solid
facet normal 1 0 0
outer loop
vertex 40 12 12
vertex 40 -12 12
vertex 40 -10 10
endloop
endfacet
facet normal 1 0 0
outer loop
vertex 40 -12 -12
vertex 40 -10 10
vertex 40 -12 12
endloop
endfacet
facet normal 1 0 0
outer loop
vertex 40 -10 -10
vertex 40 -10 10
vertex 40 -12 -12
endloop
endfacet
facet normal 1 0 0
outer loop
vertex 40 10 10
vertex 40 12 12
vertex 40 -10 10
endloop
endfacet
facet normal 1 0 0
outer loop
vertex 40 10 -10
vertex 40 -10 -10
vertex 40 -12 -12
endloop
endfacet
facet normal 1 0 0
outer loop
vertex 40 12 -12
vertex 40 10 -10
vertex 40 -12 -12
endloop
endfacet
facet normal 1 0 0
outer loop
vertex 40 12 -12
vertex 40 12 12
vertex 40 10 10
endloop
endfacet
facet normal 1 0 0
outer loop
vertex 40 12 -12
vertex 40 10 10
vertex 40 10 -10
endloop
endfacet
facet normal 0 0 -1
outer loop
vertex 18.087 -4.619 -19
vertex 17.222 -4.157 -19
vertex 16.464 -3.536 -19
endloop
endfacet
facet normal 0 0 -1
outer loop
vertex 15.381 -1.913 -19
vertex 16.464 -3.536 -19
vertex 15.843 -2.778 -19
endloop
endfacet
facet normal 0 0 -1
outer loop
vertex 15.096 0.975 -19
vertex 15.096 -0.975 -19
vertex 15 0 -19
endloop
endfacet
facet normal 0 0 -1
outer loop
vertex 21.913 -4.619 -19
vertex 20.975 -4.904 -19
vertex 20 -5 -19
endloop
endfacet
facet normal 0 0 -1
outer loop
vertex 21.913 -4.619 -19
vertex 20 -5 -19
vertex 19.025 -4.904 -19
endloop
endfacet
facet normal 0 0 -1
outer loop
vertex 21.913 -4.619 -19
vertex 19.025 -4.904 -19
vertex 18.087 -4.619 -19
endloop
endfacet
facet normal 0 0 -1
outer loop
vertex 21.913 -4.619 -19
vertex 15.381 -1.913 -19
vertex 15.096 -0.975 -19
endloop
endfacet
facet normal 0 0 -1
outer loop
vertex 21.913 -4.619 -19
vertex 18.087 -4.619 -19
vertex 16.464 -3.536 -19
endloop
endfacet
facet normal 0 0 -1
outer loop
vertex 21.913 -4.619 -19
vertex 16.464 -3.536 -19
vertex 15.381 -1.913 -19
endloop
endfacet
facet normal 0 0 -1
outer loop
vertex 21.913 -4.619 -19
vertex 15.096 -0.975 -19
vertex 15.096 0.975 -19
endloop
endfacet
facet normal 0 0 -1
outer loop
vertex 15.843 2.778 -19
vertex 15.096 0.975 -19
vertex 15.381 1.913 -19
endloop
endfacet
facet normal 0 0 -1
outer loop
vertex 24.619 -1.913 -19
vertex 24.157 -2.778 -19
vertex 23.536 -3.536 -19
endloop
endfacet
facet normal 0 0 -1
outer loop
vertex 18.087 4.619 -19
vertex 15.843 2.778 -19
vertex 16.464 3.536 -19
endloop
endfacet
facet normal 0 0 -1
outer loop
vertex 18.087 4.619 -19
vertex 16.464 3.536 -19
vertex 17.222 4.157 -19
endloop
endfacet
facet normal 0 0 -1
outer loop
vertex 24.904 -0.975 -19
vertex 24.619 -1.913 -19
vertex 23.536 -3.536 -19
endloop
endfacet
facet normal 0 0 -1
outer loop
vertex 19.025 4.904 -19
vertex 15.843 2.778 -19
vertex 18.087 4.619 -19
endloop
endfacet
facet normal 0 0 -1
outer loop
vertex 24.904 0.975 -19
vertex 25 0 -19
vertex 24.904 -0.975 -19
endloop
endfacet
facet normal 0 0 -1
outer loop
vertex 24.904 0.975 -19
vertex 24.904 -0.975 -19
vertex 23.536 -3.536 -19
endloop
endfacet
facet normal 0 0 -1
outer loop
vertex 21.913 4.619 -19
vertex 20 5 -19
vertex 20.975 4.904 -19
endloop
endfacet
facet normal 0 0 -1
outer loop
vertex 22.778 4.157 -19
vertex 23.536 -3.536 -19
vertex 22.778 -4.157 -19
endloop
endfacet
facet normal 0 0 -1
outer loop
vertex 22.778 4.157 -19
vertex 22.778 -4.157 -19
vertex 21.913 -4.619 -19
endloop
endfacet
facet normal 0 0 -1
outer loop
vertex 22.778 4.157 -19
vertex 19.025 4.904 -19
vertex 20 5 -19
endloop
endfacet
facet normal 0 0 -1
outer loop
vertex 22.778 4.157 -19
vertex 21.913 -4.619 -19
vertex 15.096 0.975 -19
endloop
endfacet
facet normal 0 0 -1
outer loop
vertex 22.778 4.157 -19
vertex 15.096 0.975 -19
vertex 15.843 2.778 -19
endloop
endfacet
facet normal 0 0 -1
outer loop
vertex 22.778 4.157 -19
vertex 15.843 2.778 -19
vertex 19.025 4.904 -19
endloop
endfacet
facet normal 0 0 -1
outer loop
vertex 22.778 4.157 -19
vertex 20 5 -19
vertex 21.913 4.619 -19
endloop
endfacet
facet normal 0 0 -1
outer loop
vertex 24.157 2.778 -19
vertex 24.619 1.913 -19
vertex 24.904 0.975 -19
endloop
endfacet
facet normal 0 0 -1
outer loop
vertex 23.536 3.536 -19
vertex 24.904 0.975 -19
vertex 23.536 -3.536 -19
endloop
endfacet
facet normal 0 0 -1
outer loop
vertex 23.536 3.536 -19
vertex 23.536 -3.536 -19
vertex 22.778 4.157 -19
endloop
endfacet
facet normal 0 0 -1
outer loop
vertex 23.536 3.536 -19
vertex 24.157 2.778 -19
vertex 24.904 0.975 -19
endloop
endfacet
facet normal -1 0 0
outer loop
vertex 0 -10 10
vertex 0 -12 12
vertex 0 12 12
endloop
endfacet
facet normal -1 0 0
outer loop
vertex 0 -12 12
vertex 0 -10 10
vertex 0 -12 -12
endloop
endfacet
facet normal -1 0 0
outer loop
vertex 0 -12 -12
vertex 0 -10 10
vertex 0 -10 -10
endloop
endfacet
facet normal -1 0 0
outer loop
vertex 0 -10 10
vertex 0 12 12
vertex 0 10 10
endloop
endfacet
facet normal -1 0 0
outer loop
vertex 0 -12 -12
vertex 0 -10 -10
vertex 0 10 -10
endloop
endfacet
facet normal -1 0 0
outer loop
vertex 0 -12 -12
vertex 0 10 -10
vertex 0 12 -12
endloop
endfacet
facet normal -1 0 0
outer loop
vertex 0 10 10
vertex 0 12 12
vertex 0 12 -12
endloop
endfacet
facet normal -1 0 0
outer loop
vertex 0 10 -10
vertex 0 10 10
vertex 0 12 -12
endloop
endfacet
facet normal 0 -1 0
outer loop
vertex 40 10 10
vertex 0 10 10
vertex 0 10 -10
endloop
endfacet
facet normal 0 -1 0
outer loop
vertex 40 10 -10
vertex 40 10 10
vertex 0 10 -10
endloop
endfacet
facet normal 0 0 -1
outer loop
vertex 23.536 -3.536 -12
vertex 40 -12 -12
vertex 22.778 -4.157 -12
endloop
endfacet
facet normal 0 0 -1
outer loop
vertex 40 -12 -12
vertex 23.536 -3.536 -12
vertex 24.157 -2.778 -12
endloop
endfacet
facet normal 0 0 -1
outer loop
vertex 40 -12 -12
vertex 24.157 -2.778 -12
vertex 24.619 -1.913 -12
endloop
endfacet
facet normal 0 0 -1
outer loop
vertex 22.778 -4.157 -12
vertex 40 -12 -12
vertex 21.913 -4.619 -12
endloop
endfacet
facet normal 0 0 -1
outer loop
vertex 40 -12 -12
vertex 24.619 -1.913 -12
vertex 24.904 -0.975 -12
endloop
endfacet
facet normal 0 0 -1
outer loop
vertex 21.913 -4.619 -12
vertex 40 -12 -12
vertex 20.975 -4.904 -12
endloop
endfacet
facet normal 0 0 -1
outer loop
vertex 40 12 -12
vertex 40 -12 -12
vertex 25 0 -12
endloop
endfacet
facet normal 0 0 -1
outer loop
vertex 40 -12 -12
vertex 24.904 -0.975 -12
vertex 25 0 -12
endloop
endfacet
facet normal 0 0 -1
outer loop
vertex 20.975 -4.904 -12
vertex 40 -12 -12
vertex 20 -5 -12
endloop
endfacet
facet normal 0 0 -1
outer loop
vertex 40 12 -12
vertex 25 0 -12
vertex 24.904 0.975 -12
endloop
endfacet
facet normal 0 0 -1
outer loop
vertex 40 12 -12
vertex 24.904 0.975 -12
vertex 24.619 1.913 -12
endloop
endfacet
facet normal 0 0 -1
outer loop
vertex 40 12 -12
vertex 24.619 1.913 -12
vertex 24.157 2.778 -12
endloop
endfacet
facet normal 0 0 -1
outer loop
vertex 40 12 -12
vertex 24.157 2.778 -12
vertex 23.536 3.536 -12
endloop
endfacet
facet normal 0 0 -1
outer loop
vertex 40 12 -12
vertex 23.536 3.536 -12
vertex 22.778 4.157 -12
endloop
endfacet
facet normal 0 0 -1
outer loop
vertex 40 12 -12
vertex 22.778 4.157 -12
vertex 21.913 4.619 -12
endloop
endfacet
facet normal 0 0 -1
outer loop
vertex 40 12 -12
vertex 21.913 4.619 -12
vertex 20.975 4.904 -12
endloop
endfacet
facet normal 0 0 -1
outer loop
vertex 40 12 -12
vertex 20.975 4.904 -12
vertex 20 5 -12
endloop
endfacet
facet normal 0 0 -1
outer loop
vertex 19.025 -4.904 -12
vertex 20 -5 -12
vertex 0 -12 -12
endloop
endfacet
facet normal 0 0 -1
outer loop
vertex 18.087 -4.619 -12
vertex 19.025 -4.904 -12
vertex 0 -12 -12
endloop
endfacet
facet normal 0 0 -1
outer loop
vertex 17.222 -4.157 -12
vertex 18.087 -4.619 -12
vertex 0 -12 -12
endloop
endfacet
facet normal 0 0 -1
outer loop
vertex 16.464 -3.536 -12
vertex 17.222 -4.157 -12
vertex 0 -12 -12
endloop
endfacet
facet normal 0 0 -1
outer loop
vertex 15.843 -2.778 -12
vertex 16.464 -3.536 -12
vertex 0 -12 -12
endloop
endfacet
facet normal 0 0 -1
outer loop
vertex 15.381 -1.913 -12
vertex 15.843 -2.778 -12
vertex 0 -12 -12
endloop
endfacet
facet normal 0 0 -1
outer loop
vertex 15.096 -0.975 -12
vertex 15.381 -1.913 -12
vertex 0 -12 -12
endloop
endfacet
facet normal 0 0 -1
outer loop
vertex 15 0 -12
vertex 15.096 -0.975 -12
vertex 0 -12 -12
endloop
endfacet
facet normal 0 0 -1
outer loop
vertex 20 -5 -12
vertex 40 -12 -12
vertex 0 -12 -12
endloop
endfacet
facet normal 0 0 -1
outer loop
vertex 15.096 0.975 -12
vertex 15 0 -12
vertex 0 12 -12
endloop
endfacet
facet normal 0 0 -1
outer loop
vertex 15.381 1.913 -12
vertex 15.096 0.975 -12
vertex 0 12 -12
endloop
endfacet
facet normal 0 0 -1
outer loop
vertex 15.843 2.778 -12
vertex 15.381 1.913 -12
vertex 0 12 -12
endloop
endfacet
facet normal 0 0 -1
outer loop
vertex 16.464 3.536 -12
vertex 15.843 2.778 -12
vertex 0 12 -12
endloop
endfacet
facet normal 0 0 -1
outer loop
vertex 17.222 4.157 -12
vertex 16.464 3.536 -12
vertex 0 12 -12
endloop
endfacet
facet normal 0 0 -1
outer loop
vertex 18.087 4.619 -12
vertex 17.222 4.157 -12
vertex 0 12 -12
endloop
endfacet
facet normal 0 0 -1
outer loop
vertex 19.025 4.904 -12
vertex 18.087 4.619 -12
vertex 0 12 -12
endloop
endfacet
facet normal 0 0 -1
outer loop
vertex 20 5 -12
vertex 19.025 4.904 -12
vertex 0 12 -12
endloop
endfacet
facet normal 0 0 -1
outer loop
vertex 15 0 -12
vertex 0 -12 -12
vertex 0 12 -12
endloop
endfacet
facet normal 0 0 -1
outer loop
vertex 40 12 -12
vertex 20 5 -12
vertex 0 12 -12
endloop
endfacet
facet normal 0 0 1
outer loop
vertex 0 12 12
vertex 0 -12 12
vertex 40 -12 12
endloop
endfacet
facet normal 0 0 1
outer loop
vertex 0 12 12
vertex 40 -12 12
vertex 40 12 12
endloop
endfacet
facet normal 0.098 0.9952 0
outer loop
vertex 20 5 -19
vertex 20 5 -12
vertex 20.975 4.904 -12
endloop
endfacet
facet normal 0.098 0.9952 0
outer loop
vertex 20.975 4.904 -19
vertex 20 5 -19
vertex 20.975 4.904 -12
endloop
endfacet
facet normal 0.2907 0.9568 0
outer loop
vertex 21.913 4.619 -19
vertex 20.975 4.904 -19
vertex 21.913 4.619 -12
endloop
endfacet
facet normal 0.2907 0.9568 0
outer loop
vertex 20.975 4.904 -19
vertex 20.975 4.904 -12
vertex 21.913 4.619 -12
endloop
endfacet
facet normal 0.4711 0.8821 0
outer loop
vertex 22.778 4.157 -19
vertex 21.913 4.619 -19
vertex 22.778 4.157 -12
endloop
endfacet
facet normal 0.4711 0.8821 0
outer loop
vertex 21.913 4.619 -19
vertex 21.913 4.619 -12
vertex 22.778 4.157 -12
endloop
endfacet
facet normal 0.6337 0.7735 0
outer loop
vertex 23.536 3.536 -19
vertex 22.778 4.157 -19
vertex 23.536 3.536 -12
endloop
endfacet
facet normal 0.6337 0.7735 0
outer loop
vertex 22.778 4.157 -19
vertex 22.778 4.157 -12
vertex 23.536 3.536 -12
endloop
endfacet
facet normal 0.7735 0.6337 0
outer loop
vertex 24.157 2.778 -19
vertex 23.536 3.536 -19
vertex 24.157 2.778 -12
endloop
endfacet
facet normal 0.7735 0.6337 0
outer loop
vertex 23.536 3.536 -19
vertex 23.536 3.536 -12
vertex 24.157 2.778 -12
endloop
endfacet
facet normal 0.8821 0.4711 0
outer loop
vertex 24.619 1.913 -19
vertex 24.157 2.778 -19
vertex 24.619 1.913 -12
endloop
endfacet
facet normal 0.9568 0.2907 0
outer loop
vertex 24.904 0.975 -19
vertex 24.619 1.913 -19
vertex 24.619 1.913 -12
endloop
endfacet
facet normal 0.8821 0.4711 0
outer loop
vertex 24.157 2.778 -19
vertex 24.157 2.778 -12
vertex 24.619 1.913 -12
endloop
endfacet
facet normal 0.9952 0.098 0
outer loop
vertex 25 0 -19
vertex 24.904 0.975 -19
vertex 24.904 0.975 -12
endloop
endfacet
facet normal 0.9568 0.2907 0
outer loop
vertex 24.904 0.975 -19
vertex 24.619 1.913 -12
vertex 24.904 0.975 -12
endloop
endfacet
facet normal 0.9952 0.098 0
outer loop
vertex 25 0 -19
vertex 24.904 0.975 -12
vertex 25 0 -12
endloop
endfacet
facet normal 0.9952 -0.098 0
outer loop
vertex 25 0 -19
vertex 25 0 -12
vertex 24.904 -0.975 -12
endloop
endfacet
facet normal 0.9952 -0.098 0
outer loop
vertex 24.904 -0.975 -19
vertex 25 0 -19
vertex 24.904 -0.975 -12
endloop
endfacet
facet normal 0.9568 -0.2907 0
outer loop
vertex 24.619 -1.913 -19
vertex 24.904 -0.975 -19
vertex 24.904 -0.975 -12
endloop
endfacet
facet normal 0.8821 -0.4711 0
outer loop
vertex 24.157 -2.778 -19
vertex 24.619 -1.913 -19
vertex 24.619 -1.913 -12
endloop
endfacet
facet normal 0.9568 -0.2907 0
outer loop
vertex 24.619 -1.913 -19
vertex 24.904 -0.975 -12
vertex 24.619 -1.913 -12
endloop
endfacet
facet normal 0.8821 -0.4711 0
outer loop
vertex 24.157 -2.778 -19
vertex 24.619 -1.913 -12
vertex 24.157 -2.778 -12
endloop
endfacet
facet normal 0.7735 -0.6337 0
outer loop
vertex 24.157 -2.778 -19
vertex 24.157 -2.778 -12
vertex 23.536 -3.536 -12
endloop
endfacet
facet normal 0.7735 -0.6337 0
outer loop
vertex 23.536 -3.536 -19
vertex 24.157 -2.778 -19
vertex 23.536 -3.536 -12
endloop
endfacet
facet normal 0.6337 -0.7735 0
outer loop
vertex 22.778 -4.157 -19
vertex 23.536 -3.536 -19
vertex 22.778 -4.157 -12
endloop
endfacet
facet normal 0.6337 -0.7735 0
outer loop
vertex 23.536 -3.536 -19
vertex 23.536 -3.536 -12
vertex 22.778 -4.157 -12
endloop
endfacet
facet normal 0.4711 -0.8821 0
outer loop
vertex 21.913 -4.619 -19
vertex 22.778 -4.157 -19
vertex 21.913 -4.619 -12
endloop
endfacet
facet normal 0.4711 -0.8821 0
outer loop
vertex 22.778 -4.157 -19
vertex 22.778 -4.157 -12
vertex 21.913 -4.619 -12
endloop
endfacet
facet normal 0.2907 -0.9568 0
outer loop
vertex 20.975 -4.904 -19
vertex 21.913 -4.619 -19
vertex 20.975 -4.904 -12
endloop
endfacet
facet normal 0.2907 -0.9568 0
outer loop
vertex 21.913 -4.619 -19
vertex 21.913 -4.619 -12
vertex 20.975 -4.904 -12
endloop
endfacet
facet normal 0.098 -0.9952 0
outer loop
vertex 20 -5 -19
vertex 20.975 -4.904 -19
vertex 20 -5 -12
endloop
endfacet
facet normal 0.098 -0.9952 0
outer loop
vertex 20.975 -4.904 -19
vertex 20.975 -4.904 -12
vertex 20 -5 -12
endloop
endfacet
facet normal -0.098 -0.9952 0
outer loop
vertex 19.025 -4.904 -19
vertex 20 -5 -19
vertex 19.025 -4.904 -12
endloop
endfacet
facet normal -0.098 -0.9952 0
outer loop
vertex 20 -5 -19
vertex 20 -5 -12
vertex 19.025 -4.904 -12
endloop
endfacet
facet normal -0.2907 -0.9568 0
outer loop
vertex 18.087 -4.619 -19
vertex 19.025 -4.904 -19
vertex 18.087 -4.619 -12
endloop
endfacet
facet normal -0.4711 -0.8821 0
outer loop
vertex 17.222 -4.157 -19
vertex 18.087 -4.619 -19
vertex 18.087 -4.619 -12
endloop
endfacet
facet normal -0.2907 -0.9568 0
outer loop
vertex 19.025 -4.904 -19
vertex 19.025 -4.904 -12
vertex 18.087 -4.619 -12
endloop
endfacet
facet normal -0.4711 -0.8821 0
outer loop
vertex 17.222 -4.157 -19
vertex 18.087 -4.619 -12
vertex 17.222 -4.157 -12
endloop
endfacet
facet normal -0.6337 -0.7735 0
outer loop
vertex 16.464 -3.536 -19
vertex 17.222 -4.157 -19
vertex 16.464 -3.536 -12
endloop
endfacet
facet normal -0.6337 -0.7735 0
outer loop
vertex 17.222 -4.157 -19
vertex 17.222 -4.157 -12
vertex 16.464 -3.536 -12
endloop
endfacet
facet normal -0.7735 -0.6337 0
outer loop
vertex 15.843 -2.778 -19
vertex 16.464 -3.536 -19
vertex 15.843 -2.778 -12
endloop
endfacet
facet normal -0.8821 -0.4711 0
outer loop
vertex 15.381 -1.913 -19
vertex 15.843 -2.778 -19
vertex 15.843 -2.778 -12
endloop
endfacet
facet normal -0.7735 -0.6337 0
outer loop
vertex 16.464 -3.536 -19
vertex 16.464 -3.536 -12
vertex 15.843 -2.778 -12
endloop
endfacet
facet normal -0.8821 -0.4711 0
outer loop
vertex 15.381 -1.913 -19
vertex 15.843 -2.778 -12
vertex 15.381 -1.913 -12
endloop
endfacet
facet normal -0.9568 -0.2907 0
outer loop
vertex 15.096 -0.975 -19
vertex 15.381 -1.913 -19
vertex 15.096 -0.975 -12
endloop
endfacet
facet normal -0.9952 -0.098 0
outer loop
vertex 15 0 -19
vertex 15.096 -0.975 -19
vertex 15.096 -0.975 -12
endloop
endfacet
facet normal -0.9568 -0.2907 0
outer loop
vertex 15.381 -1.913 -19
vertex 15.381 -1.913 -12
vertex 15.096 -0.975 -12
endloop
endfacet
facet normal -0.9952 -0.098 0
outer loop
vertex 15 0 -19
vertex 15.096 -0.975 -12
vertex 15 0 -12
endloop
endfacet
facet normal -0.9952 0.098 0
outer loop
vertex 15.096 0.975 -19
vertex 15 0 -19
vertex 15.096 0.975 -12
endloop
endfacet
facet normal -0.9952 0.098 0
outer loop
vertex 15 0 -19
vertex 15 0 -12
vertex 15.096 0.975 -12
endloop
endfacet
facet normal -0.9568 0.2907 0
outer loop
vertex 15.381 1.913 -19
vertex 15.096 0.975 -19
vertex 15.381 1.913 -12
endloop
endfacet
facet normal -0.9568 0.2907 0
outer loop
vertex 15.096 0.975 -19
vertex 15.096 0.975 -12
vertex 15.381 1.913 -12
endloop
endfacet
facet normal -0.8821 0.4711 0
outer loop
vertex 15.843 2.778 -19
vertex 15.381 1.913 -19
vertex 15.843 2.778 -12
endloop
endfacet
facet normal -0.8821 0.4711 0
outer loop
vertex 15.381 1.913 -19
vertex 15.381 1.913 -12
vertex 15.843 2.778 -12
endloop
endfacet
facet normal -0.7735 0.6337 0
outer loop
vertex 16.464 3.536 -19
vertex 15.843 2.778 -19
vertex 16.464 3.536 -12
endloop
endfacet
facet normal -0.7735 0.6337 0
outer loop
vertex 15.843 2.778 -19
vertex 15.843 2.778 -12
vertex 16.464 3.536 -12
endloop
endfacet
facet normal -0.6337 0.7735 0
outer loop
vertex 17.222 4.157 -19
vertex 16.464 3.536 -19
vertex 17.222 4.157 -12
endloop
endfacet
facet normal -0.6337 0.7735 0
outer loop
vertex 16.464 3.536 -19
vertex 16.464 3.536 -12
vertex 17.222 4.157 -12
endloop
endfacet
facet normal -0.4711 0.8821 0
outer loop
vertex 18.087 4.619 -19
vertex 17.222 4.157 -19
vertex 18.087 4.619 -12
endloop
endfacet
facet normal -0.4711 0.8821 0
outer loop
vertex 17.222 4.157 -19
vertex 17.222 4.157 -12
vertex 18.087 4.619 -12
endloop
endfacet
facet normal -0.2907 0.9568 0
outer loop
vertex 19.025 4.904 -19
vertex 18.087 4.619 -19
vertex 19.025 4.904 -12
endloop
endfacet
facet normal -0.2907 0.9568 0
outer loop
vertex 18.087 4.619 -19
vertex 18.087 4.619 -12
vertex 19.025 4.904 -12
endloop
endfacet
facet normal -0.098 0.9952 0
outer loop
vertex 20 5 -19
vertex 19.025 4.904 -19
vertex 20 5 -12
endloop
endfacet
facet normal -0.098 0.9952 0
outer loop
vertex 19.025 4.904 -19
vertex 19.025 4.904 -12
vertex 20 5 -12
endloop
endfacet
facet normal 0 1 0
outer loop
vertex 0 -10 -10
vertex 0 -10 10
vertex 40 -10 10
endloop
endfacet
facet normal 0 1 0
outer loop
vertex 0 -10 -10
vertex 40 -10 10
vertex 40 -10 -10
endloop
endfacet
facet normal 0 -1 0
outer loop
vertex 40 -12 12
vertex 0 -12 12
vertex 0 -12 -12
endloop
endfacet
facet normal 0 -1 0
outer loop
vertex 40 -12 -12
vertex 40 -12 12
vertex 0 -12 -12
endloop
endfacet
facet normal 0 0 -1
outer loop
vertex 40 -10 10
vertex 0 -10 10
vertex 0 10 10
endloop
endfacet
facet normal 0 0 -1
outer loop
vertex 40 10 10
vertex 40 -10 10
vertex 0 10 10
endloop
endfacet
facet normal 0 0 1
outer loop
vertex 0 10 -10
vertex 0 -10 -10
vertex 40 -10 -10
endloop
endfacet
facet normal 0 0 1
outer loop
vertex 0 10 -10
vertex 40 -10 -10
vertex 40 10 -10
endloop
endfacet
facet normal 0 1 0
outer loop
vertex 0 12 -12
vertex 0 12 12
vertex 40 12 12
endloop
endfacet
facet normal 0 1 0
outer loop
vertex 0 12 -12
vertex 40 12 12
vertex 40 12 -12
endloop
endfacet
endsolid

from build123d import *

# Parameters (mm, degrees)
SKETCH1_W           = 24
SKETCH1_H           = 24
SKETCH1_W_2         = 20
SKETCH1_H_2         = 20
BOSS_EXTRUDE1_DEPTH = 40
SKETCH2_R           = 5
BOSS_EXTRUDE2_DEPTH = 7


with BuildPart() as part:
    # Sketch1 → Boss-Extrude1 (new body)
    with BuildSketch(Plane(origin=(0, 0, 0), x_dir=(0, 0, -1), z_dir=(1, 0, 0))):
        Rectangle(SKETCH1_W, SKETCH1_H)
        Rectangle(SKETCH1_W_2, SKETCH1_H_2, mode=Mode.SUBTRACT)
    extrude(amount=BOSS_EXTRUDE1_DEPTH)

    # Sketch2 → Boss-Extrude2 (add)
    with BuildSketch(Plane(origin=(0, 0, -12), x_dir=(-1, 0, 0), z_dir=(0, 0, -1))):
        with Locations(Location((-20, 0, 0), (0, 0, 90))):
            Circle(SKETCH2_R)
    extrude(amount=BOSS_EXTRUDE2_DEPTH)


solid = part.part
